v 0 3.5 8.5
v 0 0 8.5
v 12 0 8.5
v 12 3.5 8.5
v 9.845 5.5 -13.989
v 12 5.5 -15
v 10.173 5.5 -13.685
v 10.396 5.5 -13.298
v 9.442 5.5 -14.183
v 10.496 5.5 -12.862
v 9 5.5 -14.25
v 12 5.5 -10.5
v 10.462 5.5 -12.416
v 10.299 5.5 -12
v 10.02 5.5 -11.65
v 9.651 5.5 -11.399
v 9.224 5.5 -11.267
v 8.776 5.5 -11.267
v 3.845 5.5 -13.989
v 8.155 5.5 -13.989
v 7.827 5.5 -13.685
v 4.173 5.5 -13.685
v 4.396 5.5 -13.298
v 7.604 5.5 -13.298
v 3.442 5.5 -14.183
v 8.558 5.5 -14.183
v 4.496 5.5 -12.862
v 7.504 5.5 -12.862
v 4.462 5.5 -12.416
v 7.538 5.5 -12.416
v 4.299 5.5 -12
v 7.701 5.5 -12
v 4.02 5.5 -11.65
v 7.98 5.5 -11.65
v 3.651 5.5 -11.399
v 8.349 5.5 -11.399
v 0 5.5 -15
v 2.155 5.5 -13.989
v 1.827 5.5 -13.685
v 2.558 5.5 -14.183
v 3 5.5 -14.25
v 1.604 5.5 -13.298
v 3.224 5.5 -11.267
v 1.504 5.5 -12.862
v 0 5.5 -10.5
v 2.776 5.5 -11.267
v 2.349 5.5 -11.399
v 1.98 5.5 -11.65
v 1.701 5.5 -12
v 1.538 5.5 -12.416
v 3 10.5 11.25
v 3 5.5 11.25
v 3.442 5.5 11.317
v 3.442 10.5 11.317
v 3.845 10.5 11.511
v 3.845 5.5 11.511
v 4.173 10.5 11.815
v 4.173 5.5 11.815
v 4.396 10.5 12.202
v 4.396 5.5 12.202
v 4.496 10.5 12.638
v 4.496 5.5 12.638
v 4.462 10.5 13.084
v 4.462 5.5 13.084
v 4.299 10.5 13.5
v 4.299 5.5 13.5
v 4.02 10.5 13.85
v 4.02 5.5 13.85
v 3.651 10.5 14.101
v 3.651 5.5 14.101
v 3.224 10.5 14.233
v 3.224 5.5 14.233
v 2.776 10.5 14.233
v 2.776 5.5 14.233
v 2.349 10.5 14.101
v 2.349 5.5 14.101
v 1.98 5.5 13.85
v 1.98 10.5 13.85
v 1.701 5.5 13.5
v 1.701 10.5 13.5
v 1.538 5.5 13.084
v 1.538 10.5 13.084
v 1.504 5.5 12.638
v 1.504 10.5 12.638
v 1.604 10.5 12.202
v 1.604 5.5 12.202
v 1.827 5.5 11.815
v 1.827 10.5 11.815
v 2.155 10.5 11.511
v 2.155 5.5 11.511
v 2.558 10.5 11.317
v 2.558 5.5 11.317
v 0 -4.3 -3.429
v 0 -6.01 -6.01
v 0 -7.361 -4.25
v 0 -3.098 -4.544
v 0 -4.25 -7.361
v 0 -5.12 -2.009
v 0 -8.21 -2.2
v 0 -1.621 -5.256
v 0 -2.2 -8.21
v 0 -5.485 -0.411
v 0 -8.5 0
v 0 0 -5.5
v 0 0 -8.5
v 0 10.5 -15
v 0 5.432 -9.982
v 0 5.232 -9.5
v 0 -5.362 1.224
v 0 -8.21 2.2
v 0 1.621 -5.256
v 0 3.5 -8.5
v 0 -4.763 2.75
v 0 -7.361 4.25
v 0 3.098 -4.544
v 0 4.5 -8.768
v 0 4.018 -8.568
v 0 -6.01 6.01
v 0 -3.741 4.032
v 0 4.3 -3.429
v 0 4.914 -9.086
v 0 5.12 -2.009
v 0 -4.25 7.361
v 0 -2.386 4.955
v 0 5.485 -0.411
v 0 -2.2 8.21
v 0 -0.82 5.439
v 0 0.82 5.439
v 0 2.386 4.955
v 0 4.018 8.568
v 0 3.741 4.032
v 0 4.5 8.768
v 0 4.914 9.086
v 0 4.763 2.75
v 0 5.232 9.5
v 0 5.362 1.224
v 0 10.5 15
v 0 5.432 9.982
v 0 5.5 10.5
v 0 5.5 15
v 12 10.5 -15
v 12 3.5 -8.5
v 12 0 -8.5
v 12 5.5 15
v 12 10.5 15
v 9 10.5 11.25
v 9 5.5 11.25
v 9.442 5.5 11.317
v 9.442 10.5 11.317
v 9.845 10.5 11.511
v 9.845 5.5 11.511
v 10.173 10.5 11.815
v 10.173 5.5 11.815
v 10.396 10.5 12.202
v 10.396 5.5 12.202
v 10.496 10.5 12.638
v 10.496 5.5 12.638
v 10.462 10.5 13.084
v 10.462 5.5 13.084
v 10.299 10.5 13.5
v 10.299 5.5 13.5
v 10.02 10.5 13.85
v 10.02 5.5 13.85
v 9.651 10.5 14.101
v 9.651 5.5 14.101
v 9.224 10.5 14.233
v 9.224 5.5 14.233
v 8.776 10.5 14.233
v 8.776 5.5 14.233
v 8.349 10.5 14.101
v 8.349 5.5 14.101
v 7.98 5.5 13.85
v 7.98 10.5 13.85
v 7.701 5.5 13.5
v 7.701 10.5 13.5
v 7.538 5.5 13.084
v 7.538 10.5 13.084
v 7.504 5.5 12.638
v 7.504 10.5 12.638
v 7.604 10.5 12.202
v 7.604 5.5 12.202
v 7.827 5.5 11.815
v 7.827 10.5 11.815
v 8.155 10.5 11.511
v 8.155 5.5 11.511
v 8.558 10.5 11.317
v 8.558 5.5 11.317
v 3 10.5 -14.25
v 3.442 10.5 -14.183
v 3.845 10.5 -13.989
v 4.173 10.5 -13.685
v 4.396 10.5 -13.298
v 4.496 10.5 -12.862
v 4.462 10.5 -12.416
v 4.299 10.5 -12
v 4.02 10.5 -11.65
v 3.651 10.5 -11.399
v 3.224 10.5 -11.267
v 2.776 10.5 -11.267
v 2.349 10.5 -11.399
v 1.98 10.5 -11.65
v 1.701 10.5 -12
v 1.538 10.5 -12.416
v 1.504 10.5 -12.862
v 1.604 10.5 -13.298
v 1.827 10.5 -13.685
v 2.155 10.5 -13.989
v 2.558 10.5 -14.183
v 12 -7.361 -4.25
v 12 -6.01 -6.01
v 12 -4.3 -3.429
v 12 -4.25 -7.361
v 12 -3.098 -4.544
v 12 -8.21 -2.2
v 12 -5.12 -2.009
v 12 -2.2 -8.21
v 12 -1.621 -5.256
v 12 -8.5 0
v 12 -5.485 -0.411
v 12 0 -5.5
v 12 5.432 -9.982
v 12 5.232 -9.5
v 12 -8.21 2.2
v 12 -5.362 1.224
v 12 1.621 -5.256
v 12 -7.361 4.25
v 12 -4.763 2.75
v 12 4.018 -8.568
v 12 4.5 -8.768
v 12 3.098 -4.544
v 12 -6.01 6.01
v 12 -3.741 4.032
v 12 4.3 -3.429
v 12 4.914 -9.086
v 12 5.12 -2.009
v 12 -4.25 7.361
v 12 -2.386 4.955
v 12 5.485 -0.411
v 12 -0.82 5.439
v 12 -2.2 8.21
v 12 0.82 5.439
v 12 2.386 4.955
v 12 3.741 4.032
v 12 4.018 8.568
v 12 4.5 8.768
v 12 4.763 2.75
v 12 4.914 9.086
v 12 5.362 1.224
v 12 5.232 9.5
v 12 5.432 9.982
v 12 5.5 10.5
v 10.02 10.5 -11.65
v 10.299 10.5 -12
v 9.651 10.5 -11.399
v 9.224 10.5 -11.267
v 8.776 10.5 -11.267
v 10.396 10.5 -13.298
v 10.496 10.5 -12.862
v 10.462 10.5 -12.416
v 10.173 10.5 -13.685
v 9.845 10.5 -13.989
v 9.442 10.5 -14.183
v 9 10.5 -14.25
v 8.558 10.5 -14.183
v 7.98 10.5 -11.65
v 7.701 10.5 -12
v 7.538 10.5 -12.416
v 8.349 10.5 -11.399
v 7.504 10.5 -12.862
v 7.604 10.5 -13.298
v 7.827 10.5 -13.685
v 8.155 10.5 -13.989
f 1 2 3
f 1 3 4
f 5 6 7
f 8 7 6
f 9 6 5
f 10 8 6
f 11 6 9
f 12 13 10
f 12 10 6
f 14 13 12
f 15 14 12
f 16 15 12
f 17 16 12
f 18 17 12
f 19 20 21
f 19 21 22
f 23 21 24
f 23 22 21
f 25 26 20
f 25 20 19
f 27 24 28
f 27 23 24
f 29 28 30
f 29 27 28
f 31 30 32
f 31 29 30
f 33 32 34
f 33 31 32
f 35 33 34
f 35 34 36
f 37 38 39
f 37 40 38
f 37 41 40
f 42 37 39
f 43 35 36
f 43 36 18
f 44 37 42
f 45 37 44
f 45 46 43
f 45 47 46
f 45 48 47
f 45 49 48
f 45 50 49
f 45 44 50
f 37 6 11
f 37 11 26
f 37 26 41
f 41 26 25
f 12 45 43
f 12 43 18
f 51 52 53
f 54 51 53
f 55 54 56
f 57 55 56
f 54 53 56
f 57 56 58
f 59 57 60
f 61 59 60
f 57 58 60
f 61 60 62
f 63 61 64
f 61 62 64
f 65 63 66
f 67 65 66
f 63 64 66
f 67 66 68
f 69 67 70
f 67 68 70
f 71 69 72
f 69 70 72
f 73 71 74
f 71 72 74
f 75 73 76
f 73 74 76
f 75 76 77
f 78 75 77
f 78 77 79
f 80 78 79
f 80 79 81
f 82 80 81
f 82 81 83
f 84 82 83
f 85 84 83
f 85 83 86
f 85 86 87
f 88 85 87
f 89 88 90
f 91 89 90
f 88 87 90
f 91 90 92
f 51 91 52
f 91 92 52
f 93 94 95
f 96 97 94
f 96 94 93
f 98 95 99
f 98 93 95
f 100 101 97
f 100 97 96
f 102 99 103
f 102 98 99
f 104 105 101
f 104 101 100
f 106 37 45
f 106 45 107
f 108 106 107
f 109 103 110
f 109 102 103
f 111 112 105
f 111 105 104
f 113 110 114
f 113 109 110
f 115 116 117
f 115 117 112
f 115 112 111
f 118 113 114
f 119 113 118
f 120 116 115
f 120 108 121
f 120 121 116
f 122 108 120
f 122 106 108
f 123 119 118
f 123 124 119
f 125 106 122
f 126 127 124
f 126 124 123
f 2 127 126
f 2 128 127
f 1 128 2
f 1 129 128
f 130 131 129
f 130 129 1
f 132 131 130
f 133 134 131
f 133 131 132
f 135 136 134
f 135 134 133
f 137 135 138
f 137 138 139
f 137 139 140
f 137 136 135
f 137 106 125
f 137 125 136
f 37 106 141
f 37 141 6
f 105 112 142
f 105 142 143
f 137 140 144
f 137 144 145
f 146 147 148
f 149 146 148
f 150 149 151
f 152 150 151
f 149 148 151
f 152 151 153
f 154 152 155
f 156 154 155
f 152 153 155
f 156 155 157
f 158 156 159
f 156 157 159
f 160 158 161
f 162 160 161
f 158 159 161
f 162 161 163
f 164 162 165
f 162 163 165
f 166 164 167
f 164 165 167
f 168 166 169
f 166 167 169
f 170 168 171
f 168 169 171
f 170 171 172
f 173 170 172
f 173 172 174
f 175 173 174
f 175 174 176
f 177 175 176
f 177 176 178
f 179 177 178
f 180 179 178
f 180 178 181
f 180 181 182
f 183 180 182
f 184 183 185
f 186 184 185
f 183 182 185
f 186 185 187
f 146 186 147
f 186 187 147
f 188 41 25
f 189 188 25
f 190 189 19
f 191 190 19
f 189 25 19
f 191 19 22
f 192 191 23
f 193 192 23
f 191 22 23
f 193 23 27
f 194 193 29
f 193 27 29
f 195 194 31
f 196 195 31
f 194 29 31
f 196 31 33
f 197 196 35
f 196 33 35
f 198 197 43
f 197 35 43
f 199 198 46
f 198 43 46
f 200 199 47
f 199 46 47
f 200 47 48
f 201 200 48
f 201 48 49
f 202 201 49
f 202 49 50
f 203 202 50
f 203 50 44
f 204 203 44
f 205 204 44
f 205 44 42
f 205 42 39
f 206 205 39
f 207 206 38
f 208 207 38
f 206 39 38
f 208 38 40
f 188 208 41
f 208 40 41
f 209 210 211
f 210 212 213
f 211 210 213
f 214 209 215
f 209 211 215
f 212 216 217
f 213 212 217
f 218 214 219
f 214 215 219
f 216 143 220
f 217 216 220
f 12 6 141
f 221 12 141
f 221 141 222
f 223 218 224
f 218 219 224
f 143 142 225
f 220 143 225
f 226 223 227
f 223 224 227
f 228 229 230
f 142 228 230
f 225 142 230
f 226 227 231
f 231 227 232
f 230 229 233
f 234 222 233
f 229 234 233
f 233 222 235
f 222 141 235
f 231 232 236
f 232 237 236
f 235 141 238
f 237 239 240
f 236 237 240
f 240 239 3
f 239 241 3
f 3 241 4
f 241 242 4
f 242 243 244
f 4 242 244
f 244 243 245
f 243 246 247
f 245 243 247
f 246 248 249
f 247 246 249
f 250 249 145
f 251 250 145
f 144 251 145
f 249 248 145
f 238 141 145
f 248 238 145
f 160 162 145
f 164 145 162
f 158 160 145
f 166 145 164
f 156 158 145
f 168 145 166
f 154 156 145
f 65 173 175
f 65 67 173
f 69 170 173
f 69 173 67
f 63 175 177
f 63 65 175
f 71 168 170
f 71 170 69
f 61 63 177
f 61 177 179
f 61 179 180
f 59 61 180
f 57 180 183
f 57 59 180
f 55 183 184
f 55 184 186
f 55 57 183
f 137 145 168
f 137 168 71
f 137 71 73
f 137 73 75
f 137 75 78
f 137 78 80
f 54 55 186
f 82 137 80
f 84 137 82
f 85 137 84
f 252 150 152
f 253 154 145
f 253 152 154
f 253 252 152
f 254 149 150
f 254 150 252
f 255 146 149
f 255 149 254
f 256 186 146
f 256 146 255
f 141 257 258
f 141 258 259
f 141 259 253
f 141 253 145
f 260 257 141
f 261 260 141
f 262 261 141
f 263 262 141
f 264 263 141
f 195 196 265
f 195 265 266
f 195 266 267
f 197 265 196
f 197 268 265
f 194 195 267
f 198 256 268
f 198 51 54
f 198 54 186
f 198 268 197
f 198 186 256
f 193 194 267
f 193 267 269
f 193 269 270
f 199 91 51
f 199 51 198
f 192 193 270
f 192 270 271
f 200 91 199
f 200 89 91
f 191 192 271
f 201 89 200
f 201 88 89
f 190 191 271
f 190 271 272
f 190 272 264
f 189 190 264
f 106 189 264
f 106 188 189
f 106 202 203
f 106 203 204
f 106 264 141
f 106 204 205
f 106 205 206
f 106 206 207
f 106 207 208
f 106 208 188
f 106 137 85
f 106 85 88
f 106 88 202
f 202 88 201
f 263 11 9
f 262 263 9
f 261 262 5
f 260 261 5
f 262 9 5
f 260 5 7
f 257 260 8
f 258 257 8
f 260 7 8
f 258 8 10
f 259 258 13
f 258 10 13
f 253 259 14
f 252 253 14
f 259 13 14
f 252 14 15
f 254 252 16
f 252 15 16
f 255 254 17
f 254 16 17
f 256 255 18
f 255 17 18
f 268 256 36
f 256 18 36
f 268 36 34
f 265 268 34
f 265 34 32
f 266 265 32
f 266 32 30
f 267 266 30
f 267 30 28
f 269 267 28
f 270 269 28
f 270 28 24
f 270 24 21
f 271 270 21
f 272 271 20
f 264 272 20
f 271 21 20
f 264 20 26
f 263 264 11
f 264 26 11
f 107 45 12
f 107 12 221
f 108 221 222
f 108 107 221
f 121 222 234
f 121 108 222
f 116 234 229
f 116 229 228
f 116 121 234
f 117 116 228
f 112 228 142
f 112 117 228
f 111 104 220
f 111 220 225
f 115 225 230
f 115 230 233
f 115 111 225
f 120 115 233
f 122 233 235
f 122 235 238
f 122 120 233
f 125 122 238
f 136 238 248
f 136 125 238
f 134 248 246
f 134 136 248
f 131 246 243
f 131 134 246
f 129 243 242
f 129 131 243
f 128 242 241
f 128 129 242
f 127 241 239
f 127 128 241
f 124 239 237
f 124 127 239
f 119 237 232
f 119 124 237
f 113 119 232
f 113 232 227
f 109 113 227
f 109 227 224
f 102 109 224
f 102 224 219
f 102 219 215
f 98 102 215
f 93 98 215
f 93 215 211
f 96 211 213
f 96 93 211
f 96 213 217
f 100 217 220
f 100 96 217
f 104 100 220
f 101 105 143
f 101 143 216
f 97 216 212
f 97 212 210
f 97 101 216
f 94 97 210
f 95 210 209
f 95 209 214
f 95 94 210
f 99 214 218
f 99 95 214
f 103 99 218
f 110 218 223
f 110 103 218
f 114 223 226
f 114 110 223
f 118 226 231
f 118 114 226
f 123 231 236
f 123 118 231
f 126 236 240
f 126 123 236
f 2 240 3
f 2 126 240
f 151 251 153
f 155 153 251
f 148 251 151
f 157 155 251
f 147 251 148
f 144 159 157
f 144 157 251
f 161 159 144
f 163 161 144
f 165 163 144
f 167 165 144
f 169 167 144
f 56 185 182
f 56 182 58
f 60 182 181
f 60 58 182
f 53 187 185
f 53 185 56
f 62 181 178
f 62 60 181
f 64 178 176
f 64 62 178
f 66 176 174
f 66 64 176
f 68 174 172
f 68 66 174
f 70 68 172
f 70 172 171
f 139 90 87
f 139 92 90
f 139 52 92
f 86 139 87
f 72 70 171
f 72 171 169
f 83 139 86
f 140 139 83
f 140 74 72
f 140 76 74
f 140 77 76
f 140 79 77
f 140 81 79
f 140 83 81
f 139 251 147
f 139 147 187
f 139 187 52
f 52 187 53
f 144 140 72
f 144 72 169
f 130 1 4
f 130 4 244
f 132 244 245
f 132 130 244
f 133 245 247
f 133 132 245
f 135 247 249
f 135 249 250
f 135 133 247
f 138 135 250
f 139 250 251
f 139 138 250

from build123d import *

# Parameters (mm, degrees)
SKETCH_2_R          = 5.5
EXTRUDE_1_DEPTH     = 12
SKETCH_5_R          = 1.5
CUT_EXTRUDE_1_DEPTH = 5


with BuildPart() as part:
    # 草图2 → 凸台-拉伸1 (new body)
    with BuildSketch(Plane(origin=(0, 0, 0), x_dir=(0, 0, -1), z_dir=(1, 0, 0))):
        with BuildLine():
            Line((-15, 5.5), (-15, 10.5))
            Line((-15, 10.5), (15, 10.5))
            Line((15, 10.5), (15, 5.5))
            Line((15, 5.5), (10.5, 5.5))
            ThreePointArc((10.5, 5.5), (9.085786438, 4.914213562), (8.5, 3.5))
            Line((8.5, 3.5), (8.5, 0))
            ThreePointArc((8.5, 0), (0, -8.5), (-8.5, 0))
            Line((-8.5, 0), (-8.5, 3.5))
            ThreePointArc((-8.5, 3.5), (-9.085786438, 4.914213562), (-10.5, 5.5))
            Line((-10.5, 5.5), (-15, 5.5))
        make_face()
        Circle(SKETCH_2_R, mode=Mode.SUBTRACT)
    extrude(amount=EXTRUDE_1_DEPTH)

    # 草图5 → 切除-拉伸1 (cut)
    with BuildSketch(Plane.XZ.offset(-5.5)):
        with Locations(Location((3, 12.75, 0), (0, 0, 270))):
            Circle(SKETCH_5_R)
        with Locations(Location((9, 12.75, 0), (0, 0, 270))):
            Circle(SKETCH_5_R)
        with Locations(Location((9, -12.75, 0), (0, 0, 270))):
            Circle(SKETCH_5_R)
        with Locations(Location((3, -12.75, 0), (0, 0, 270))):
            Circle(SKETCH_5_R)
    extrude(amount=-CUT_EXTRUDE_1_DEPTH, mode=Mode.SUBTRACT)


solid = part.part
